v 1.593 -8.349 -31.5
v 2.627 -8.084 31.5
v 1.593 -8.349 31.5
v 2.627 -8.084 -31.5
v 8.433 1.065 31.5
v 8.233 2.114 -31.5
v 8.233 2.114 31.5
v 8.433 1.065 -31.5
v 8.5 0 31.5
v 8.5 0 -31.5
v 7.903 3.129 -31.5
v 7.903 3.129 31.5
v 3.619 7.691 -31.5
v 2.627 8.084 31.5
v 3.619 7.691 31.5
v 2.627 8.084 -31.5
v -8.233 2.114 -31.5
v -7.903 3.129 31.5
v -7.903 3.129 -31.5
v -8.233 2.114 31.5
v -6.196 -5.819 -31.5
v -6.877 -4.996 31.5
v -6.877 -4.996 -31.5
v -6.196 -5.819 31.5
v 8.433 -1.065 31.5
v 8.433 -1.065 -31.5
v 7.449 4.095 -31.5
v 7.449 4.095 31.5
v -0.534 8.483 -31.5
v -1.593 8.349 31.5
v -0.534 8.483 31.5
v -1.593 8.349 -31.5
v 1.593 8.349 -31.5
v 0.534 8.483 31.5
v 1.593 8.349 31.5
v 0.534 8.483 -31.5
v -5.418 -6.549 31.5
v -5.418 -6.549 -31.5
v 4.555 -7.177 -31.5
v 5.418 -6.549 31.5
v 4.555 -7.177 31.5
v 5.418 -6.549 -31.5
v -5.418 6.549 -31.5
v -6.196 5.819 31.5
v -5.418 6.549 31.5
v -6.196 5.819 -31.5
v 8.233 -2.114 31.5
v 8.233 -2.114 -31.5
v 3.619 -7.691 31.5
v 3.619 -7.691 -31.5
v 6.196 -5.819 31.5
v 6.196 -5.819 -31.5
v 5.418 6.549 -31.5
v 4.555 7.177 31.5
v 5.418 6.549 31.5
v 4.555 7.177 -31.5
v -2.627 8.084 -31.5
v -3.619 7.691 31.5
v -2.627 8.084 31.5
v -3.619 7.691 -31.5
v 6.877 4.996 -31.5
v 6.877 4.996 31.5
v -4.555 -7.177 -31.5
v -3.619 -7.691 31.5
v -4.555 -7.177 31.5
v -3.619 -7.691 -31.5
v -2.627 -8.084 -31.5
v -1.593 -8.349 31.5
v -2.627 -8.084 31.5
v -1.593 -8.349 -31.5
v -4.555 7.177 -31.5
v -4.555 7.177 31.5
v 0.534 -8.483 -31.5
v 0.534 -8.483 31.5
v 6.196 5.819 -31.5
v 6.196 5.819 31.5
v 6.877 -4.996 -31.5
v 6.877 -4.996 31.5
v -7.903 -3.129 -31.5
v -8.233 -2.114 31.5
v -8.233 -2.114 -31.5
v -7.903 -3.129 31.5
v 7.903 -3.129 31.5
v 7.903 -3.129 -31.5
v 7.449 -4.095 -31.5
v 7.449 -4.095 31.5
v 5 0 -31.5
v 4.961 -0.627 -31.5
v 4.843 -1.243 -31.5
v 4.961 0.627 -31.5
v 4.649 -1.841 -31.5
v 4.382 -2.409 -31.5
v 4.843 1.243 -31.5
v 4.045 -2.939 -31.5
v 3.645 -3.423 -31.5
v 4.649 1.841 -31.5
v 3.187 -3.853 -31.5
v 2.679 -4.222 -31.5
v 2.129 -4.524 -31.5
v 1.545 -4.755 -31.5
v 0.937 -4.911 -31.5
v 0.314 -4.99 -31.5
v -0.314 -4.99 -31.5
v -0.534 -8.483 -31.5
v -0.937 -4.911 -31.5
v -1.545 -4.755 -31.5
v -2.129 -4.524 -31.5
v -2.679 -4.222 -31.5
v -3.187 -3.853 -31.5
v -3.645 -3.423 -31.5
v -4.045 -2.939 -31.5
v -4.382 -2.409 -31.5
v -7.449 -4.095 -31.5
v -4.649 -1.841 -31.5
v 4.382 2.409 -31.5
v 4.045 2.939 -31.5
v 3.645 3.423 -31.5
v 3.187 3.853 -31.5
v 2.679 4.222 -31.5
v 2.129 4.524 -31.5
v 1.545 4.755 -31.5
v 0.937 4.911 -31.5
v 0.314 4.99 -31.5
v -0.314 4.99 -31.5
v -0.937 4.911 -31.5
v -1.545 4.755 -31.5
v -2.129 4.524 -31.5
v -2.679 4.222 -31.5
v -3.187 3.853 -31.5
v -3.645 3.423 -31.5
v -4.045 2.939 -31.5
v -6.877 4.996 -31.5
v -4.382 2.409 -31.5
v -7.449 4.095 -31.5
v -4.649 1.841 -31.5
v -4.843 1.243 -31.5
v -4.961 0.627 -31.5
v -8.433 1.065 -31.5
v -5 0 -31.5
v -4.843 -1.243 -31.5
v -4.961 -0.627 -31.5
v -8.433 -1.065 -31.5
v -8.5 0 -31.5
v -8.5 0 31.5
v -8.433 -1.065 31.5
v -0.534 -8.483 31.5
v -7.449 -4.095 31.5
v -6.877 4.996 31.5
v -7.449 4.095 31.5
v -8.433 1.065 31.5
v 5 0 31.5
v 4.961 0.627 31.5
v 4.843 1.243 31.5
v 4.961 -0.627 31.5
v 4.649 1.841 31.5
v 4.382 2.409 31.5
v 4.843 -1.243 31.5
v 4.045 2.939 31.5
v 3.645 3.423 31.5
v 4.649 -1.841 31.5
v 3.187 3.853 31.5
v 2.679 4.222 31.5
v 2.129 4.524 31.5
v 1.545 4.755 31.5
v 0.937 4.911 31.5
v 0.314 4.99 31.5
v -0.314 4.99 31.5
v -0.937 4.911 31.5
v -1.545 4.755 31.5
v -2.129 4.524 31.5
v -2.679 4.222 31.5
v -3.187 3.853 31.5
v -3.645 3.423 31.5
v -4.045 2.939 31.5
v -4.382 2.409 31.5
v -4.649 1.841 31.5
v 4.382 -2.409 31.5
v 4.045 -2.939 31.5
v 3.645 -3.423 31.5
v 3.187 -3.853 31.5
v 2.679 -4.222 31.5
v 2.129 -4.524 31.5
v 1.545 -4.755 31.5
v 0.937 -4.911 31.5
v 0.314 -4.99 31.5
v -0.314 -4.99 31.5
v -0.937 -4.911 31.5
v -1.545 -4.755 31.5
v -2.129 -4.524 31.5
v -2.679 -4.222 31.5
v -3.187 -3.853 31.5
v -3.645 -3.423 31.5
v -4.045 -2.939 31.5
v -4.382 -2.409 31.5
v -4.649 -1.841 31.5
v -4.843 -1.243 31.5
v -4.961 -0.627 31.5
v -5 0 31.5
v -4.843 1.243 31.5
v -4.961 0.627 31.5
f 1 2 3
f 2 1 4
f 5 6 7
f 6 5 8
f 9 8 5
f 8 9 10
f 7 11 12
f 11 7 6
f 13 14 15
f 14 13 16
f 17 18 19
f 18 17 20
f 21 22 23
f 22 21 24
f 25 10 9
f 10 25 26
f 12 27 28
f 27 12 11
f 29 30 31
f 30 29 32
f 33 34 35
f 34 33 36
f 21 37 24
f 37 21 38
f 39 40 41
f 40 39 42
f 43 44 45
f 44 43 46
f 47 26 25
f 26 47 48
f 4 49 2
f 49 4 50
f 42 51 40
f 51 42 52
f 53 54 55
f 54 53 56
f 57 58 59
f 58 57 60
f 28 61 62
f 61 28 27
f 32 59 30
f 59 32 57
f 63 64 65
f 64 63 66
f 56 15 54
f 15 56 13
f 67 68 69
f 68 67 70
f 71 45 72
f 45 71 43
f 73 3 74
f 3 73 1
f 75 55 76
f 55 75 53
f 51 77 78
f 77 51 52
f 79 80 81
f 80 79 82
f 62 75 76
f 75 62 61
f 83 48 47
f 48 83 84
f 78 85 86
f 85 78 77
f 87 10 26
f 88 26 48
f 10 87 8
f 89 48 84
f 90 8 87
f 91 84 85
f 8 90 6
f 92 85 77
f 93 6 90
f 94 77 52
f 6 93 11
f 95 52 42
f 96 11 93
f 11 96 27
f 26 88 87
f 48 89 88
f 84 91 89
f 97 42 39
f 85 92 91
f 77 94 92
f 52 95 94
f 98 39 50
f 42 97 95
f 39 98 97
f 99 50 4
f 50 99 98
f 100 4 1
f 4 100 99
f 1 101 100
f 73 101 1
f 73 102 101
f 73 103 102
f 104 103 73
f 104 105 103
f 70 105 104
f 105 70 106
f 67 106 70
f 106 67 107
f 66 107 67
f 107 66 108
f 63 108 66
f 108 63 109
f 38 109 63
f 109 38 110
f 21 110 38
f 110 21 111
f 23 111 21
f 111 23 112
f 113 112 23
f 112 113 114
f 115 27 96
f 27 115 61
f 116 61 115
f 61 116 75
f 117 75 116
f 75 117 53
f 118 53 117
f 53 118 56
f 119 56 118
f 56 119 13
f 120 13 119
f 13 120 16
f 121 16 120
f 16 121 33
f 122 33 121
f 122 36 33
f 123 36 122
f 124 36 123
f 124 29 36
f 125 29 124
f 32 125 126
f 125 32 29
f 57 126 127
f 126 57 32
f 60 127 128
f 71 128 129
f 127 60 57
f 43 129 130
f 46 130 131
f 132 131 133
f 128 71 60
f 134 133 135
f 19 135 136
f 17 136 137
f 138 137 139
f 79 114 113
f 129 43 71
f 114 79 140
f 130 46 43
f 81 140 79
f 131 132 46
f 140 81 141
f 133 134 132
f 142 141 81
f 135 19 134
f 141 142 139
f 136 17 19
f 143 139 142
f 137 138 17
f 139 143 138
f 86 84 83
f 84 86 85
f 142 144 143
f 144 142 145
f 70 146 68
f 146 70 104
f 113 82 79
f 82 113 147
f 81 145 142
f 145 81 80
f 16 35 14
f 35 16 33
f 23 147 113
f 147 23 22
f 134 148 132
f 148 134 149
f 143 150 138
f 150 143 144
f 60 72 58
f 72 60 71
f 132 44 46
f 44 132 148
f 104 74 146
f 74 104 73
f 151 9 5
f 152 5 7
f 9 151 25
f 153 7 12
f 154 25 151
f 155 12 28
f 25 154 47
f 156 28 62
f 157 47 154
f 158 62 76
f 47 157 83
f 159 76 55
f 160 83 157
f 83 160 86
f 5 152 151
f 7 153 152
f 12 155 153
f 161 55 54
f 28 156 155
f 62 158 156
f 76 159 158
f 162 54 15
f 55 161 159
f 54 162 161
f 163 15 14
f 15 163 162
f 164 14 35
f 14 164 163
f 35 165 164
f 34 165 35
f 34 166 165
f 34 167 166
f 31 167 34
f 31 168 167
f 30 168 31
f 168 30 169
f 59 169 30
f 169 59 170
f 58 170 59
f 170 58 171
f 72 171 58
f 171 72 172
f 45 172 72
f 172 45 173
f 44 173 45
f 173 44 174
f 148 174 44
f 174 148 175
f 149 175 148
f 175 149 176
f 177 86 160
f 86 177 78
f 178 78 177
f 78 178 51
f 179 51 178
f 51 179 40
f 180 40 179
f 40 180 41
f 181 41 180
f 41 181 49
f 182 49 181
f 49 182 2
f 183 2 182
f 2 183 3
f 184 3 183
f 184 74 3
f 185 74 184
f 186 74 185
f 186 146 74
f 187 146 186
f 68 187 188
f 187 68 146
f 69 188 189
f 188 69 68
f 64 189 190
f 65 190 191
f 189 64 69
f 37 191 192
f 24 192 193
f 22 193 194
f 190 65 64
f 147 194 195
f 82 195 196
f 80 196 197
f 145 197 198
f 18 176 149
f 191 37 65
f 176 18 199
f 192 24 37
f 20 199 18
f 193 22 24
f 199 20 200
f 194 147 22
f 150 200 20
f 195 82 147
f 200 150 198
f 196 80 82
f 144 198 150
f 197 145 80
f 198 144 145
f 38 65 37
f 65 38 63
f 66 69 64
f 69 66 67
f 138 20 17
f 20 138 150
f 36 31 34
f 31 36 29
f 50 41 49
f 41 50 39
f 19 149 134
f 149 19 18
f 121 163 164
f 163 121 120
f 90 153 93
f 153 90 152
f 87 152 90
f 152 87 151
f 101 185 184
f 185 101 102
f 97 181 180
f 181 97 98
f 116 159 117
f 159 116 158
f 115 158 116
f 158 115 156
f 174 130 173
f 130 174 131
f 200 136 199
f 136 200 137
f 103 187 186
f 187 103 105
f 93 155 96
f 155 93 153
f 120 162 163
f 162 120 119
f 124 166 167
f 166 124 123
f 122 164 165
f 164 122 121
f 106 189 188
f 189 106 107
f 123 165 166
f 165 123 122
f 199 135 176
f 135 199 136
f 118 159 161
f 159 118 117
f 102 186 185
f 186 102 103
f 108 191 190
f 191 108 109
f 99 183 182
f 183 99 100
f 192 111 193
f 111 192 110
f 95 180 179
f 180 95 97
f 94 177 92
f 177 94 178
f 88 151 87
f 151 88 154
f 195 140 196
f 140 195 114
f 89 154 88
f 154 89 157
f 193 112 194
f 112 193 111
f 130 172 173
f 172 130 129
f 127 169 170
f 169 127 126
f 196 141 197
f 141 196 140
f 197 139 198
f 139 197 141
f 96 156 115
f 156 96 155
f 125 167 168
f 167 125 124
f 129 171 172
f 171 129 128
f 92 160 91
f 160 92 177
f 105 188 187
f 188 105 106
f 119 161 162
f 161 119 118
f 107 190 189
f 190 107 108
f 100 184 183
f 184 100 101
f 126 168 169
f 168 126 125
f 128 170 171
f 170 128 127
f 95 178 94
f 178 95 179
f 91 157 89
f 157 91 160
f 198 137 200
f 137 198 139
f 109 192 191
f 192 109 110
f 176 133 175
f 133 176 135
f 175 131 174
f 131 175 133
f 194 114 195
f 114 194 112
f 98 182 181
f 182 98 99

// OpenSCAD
$fn = 50;


difference() {
	union() {
		translate(v = [0, 0, -31.5000000000]) {
			cylinder(h = 63, r = 8.5000000000);
		}
	}
	union() {
		translate(v = [0, 0, -100.0000000000]) {
			cylinder(h = 200, r = 5.0000000000);
		}
	}
}
